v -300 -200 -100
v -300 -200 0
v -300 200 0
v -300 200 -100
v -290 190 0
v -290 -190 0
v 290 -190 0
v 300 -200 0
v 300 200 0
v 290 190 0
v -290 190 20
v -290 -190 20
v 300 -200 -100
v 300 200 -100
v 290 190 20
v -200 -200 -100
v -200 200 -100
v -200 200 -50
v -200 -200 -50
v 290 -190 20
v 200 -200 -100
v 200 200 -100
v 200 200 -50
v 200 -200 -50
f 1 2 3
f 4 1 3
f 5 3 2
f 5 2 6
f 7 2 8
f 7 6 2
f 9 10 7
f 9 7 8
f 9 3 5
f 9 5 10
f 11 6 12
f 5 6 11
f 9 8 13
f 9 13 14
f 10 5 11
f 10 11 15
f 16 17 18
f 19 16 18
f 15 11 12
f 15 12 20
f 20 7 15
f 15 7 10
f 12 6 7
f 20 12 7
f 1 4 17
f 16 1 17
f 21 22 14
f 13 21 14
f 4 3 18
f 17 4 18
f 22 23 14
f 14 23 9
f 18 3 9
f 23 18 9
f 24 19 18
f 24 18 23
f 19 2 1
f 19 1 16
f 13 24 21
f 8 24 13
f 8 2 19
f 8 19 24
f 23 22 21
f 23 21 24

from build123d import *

# Parameters (mm, degrees)
F0_W      = 600
F0_H      = 400
F1_DEPTH  = 100
F2_W      = 580
F2_H      = 380
F3_DEPTH  = 80
F4_W      = 400
F4_H      = 50
F5_DEPTH  = 25
F6_W      = 400
F6_H      = 50
F7_DEPTH  = 25
F8_W      = 580
F8_H      = 380
F9_DEPTH  = 20
F10_DEPTH = 400


with BuildPart() as f1:
    # F0 (on Top) → F1 (new body)
    with BuildSketch(Plane.XY):
        Rectangle(F0_W, F0_H)
    extrude(amount=-F1_DEPTH)

    # F2 (on face) → F3 (cut)
    with BuildSketch(Plane(origin=(0, 0, -100), x_dir=(1, 0, 0), z_dir=(0, 0, -1))):
        Rectangle(F2_W, F2_H)
    extrude(amount=-F3_DEPTH, mode=Mode.SUBTRACT)

    # F4 (on face) → F5 (cut)
    with BuildSketch(Plane.XZ.offset(200)):
        with Locations((0, -75)):
            Rectangle(F4_W, F4_H)
    extrude(amount=-F5_DEPTH, mode=Mode.SUBTRACT)

    # F6 (on face) → F7 (cut)
    with BuildSketch(Plane(origin=(0, 200, 0), x_dir=(-1, 0, 0), z_dir=(0, 1, 0))):
        with Locations((0, -75)):
            Rectangle(F6_W, F6_H)
    extrude(amount=-F7_DEPTH, mode=Mode.SUBTRACT)

    # F8 (on face) → F9 (join)
    with BuildSketch(Plane.XY):
        Rectangle(F8_W, F8_H)
    extrude(amount=F9_DEPTH)

    # F10 (add): a face of the model
    f10_faces = [f1.faces().sort_by_distance(p)[0] for p in [
        (0, -200, -37.5),
    ]]
    extrude(f10_faces, amount=-F10_DEPTH)


solid = f1.part
